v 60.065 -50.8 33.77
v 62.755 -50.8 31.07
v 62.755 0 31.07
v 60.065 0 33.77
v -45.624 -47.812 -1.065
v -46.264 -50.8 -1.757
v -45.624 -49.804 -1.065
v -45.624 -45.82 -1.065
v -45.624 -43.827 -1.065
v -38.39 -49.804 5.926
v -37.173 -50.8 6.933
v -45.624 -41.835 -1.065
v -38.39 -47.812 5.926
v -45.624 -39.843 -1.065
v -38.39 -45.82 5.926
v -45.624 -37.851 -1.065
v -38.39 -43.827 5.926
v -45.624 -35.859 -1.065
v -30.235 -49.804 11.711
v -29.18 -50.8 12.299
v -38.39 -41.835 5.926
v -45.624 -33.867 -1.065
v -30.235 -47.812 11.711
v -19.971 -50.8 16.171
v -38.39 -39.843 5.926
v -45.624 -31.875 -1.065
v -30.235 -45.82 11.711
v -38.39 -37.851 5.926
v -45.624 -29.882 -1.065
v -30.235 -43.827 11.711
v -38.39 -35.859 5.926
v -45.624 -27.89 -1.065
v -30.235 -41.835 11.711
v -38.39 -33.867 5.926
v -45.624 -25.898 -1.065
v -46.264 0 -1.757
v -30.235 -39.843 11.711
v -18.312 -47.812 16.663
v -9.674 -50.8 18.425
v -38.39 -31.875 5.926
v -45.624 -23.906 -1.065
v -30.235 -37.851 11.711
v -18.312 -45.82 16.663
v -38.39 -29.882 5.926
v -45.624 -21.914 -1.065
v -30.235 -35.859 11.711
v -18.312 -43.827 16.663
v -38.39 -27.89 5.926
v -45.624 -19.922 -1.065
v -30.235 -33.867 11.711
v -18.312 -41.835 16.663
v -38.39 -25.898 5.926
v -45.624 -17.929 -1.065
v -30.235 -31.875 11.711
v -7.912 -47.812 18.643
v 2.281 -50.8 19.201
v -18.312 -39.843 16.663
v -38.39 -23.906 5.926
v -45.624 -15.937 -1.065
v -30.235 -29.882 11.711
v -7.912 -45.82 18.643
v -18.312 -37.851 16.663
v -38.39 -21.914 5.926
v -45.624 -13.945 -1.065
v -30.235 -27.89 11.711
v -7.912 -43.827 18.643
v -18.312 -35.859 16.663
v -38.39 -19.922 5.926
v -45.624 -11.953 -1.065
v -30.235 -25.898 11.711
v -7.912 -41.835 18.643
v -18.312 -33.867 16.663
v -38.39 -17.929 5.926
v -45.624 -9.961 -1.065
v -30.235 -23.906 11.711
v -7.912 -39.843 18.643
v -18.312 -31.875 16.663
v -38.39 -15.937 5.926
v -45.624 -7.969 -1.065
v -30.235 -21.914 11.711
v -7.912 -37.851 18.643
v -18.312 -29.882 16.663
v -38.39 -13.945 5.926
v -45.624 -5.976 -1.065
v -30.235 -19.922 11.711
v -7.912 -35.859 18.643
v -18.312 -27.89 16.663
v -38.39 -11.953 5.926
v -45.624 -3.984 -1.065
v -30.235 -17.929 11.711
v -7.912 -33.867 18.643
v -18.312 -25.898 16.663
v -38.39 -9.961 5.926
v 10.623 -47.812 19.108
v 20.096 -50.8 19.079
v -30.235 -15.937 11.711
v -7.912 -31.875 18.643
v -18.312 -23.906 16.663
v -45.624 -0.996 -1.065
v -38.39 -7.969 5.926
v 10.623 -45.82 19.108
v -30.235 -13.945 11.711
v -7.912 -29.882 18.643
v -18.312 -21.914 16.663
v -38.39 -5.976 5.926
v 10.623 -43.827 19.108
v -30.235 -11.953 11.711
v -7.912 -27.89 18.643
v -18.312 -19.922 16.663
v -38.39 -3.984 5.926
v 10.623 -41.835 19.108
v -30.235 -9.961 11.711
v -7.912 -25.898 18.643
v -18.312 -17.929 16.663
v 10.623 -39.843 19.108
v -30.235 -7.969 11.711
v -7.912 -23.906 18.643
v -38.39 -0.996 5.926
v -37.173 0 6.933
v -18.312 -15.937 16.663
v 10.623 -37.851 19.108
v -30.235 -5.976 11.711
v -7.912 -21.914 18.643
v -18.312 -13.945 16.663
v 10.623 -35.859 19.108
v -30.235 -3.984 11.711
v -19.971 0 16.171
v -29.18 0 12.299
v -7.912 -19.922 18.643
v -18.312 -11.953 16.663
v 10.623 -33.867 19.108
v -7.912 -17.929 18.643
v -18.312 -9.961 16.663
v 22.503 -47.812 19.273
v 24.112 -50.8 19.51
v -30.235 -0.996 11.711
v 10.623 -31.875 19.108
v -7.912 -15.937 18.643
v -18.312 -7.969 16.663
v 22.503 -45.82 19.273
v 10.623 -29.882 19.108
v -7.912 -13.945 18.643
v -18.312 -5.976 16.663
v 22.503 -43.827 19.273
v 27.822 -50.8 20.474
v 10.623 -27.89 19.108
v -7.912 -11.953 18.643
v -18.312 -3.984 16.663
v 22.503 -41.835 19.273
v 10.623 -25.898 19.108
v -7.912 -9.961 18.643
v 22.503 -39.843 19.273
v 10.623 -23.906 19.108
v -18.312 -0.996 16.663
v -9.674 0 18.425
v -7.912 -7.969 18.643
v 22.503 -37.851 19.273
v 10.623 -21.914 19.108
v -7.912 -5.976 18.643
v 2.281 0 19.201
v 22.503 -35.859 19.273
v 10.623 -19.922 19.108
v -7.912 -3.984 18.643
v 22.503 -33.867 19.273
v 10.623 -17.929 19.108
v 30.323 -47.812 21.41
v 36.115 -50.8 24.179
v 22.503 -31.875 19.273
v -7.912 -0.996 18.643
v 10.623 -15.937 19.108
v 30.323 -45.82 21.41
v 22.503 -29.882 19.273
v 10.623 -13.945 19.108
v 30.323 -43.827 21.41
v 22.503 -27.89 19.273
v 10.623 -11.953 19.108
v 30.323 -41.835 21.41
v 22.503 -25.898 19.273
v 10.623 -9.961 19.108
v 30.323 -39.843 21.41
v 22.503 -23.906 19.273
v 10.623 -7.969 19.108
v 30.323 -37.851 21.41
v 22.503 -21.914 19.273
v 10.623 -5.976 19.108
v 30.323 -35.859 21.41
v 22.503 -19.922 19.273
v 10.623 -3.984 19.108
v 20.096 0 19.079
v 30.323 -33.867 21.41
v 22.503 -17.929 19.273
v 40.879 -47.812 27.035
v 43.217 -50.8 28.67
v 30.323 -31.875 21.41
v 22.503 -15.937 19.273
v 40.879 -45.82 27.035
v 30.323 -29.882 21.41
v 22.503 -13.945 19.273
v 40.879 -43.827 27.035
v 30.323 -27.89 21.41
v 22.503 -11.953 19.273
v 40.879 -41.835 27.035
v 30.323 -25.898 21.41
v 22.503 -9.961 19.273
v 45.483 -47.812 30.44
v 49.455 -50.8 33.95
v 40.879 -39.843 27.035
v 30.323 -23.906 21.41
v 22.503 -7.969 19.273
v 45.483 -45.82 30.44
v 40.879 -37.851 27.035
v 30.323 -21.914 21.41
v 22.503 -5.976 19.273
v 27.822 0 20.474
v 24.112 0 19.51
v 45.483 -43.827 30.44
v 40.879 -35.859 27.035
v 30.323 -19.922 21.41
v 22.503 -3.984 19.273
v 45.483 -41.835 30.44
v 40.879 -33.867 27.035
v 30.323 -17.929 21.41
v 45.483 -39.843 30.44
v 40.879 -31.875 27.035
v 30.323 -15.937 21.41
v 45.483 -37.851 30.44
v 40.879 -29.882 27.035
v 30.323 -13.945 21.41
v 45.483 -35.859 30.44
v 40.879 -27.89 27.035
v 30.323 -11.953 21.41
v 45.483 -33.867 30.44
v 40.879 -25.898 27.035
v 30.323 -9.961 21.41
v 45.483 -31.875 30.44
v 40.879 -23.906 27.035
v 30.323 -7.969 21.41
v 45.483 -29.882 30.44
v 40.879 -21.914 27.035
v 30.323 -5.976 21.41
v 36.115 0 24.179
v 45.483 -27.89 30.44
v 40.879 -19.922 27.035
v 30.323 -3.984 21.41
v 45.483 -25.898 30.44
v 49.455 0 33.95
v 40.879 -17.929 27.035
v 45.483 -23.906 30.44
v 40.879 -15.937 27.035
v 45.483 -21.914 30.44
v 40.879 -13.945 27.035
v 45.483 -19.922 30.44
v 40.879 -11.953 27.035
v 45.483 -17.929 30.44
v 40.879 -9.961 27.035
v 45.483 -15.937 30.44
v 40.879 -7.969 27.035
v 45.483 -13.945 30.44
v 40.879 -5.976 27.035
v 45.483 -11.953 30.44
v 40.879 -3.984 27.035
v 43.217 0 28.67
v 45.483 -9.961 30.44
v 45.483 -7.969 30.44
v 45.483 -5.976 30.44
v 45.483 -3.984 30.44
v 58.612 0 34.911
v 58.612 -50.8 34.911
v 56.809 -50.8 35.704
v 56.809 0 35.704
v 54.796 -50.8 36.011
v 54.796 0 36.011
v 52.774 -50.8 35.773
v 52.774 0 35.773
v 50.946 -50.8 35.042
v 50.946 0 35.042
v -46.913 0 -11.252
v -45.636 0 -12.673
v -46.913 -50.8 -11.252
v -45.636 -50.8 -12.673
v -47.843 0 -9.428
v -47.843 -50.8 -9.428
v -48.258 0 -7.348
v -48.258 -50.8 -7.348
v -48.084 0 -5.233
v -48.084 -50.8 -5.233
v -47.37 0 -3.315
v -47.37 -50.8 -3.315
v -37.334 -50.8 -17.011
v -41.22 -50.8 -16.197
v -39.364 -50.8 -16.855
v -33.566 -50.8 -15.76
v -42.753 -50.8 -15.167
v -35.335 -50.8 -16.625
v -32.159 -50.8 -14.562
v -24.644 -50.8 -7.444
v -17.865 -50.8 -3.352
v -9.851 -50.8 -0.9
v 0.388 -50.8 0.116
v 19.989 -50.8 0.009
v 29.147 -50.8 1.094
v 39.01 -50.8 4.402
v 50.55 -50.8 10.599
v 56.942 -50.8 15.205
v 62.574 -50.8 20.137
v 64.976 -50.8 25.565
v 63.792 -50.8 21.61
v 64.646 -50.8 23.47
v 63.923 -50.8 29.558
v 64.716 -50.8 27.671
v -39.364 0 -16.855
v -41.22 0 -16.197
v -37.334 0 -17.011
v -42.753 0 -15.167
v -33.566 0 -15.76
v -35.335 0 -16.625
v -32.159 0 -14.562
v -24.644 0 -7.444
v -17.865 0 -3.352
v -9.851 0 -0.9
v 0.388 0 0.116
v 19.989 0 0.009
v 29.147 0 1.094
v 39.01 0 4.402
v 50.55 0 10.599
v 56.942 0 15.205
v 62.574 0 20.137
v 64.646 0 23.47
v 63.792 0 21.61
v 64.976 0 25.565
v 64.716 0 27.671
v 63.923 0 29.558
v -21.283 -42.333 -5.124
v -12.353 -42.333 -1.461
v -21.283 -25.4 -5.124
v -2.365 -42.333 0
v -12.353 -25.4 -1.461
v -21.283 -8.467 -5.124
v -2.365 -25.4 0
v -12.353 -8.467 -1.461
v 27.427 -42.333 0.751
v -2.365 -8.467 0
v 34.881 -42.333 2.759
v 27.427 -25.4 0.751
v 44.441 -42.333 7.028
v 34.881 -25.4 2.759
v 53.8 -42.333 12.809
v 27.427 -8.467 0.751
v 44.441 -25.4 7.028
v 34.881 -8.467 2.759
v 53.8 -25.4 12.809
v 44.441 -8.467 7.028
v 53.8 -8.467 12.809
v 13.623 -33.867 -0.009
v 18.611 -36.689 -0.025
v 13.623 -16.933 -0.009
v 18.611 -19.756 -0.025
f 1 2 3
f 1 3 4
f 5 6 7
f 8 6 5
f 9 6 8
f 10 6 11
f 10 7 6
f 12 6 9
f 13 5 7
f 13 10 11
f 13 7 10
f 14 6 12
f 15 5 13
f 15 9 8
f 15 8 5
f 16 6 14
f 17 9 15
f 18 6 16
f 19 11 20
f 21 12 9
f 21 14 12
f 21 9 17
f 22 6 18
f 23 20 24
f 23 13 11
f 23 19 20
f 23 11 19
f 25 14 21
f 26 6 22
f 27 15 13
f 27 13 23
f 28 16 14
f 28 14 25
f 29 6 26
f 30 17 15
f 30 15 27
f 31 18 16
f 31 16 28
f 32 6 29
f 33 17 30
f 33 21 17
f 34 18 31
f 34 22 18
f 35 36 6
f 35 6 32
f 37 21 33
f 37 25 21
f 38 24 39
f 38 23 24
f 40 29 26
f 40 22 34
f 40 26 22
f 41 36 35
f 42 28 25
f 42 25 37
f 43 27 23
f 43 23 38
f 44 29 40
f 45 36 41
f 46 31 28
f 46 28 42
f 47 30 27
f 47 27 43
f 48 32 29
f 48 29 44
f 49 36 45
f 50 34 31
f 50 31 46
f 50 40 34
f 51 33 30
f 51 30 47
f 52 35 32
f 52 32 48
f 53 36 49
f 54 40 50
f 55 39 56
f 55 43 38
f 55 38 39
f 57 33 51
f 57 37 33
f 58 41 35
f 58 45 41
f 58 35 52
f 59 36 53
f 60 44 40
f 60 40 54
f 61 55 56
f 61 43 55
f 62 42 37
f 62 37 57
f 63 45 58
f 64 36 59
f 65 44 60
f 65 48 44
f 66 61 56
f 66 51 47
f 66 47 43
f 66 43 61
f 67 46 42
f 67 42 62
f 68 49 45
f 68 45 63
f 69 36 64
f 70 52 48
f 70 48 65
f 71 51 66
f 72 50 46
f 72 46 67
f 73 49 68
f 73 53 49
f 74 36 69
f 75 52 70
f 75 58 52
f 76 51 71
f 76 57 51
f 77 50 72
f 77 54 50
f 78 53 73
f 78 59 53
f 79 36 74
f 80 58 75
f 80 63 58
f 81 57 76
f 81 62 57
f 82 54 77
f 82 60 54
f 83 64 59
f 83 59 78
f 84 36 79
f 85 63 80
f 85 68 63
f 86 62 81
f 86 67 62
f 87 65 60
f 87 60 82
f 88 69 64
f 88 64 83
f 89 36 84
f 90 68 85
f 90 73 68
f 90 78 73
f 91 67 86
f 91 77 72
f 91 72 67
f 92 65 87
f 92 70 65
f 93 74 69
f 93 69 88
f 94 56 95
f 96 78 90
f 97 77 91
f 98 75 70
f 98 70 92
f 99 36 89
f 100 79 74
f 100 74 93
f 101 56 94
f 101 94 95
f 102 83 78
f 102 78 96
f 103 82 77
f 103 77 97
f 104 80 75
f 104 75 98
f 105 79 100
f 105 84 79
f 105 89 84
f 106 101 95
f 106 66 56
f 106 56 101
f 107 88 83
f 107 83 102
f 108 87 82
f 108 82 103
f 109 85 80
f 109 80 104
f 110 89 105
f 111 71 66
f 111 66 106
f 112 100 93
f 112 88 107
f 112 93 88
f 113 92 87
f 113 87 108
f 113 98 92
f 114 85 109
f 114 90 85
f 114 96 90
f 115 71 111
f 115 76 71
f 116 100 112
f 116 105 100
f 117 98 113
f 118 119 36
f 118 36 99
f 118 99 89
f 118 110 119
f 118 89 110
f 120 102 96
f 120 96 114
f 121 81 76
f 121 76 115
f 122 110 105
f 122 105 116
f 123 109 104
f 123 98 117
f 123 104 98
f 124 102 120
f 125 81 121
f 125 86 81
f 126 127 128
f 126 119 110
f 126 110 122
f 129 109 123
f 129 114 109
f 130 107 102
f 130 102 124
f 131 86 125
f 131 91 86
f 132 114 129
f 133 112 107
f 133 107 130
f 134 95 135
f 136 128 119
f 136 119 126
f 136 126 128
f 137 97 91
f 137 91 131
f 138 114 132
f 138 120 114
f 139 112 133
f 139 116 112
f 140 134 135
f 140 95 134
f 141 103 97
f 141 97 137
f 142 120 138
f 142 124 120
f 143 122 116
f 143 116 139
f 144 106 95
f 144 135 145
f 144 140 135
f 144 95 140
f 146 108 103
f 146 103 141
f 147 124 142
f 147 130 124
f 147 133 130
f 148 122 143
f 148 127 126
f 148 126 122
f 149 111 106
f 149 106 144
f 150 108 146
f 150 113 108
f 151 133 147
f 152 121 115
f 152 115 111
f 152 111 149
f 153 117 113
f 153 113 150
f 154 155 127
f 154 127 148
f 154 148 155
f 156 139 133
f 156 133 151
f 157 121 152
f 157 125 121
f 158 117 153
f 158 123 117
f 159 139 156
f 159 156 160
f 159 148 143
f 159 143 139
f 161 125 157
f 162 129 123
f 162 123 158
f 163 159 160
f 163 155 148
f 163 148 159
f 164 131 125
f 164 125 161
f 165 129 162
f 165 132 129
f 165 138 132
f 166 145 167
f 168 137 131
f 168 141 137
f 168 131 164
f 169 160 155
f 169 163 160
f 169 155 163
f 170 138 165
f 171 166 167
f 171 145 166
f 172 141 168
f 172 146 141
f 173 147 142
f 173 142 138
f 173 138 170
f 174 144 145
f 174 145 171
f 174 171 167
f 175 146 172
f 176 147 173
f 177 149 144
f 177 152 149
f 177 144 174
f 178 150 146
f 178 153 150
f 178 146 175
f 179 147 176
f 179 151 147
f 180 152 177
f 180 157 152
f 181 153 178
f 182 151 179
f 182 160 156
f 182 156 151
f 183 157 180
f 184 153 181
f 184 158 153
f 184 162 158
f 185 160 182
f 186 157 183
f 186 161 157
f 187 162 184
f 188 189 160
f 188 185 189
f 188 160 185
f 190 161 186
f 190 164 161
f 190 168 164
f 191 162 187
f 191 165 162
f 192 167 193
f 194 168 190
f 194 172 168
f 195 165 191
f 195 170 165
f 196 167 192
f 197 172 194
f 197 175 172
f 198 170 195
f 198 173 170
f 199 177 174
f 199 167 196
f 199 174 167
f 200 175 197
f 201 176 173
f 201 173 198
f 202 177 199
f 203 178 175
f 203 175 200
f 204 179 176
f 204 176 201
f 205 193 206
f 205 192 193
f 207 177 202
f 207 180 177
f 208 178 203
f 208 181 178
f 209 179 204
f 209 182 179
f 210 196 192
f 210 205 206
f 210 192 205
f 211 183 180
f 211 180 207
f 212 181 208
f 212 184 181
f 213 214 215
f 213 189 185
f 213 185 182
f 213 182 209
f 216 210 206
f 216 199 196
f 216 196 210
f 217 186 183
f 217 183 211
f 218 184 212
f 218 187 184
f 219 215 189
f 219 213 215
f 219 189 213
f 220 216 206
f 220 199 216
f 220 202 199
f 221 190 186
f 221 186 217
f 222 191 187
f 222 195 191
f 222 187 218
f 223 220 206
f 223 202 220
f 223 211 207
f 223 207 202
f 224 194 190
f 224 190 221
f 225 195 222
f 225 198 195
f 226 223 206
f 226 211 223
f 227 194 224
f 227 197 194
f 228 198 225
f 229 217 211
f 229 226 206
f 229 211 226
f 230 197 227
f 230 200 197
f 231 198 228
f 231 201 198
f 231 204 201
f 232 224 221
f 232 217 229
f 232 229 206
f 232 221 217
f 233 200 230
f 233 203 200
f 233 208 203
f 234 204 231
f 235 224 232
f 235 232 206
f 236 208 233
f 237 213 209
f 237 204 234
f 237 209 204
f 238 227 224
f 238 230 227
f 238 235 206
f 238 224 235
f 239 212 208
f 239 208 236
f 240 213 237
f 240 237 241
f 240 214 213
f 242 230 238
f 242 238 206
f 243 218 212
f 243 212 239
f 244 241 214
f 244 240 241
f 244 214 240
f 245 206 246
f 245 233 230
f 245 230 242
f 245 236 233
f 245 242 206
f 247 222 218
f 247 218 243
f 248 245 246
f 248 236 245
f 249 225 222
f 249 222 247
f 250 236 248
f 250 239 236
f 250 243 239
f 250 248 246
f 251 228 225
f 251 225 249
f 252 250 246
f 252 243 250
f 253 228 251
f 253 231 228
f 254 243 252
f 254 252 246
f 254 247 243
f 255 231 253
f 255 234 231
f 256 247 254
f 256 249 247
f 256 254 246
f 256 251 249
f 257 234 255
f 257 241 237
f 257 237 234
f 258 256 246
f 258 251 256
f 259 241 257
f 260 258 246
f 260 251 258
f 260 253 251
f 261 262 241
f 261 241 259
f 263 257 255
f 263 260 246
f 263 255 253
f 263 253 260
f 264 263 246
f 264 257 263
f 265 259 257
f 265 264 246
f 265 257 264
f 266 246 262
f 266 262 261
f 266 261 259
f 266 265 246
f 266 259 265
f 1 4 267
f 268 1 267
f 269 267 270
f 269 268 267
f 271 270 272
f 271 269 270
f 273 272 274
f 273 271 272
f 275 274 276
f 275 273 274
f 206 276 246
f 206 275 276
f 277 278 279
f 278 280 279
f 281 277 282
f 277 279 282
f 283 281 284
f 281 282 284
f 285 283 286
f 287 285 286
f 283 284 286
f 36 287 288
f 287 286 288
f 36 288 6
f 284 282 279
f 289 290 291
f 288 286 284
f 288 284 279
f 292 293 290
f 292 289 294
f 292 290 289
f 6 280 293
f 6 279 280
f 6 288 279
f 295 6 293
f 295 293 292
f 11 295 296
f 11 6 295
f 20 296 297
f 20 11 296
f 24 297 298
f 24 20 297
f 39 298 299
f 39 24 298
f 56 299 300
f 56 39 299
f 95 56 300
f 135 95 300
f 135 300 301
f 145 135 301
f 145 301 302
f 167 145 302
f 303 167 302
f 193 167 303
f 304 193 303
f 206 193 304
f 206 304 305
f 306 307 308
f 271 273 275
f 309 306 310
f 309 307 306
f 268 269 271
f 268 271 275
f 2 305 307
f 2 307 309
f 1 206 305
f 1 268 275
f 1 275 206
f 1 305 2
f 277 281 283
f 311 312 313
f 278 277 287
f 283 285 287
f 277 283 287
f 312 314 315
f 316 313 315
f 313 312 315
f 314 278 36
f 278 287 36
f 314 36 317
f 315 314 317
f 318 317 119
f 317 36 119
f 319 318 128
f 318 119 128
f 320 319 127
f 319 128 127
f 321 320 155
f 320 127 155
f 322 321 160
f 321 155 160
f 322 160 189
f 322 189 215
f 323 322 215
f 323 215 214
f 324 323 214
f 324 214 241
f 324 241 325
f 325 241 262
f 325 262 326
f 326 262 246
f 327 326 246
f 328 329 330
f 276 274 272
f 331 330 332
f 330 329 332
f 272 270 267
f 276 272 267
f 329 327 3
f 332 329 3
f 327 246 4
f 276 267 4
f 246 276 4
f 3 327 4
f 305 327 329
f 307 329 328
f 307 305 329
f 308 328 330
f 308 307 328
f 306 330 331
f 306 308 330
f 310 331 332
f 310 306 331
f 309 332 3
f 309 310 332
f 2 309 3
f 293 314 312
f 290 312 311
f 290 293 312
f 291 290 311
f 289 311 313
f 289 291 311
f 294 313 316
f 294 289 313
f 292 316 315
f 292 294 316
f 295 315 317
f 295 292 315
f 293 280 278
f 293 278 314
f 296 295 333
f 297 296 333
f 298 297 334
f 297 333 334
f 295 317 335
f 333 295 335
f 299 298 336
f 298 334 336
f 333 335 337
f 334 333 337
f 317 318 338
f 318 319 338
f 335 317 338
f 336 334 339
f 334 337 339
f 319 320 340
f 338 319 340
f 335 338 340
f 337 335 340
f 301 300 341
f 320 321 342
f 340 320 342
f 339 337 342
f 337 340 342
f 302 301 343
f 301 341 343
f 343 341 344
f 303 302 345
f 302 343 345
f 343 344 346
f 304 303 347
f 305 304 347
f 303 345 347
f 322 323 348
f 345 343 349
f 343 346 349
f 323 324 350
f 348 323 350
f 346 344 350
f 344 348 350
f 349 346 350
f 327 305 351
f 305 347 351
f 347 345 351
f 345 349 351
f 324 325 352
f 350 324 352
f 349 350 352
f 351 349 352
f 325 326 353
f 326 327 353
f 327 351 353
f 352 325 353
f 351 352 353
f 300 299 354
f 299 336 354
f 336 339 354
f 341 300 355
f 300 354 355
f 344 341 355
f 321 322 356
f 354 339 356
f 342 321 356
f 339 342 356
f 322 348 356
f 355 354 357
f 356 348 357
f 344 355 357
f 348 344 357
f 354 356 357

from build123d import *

# Parameters (mm, degrees)
F1_DEPTH = 50.8
F2_R     = 7.62


# Not quite as in the source:
# - the dataset's text gives a spline's control points without its knots; the knots are read off the source's solid


with BuildPart() as f1:
    # F0 (on Front) → F1 (new body)
    with BuildSketch(Plane.XZ):
        with BuildLine():
            Line((-51.4566205376, -7.6382097449), (-37.0489656925, -20.1010350138))
            add(Edge.make_bspline(
                [(-37.0489656925, -20.1010350138), (-32.0961571271, -14.3753384093), (-22.4411994409, -3.2137201658), (-2.567876156, 1.0362784201), (19.8507775599, -0.7305766437), (35.0126136642, 1.7996710925), (54.6374865112, 12.120662721), (63.7504331122, 21.1999324541), (68.1858584285, 25.6189666688)],
                knots=[0, 0, 0, 0, 0.1744362409, 0.340044341, 0.5157839146, 0.662689084, 0.8358250694, 1, 1, 1, 1], degree=3))
            Line((68.1858584285, 25.6189666688), (54.7404326534, 39.1142642774))
            add(Edge.make_bspline(
                [(-51.4566205376, -7.6382097449), (-50.569332054, -6.6124594882), (-48.7206333421, -4.4744710724), (-45.6807379161, -1.083016907), (-42.8655113291, 1.8341952687), (-40.3934284717, 4.1792576456), (-38.413862066, 5.9302516977), (-36.2924687687, 7.6576678013), (-34.392168296, 9.0614262042), (-32.7845564877, 10.1507045755), (-31.5329658928, 10.9476488916), (-30.2357008088, 11.7189891488), (-28.9317170147, 12.440929508), (-27.6164352854, 13.1185008592), (-25.8531615823, 13.961984086), (-22.7482671671, 15.2847678022), (-18.2999008711, 16.7576548912), (-13.9122537643, 17.7575537331), (-10.4620230508, 18.3293395163), (-7.9060318762, 18.6573853028), (-5.3849265205, 18.8972362958), (-2.8912531141, 19.060728488), (-0.4571417194, 19.1579367871), (2.6992657096, 19.2188727368), (6.4751057026, 19.1986064325), (10.688599572, 19.1069677477), (13.872523357, 19.034713831), (16.1671624828, 19.0086227881), (17.4801550196, 19.0099656248), (18.4476603272, 19.0234519818), (19.126692671, 19.0398701949), (19.7635064415, 19.0627895847), (20.5708993056, 19.1021374284), (21.5017087851, 19.1671291568), (22.853887137, 19.3033614178), (24.3475932959, 19.5320424193), (25.7829635166, 19.8577835208), (27.0218215144, 20.2115138008), (28.0214471049, 20.5347589257), (29.1187561712, 20.9292509093), (30.7086380041, 21.5547332667), (32.8673205533, 22.5055753198), (35.5872650511, 23.8682182699), (37.8559849368, 25.1420412869), (39.6138298192, 26.2132708199), (40.8886976676, 27.0336077895), (42.1078319952, 27.8629622939), (43.2480720812, 28.68464647), (44.37217855, 29.5417355035), (45.8540278008, 30.7312919433), (47.6956238749, 32.3155185334), (50.6875135665, 35.0808060073), (53.0519039531, 37.4319755301), (54.7404326534, 39.1142642774)],
                knots=[0, 0, 0, 0, 0.03125, 0.0625, 0.09375, 0.109375, 0.125, 0.140625, 0.15625, 0.1640625, 0.171875, 0.1796875, 0.1875, 0.1953125, 0.203125, 0.21875, 0.25, 0.28125, 0.296875, 0.3125, 0.328125, 0.34375, 0.359375, 0.375, 0.40625, 0.4375, 0.46875, 0.484375, 0.5, 0.5078125, 0.515625, 0.5234375, 0.53125, 0.546875, 0.5625, 0.59375, 0.625, 0.640625, 0.65625, 0.671875, 0.6875, 0.71875, 0.75, 0.78125, 0.796875, 0.8125, 0.828125, 0.84375, 0.859375, 0.875, 0.90625, 0.9375, 1, 1, 1, 1], degree=3))
        make_face()
    extrude(amount=F1_DEPTH)

    # F2
    f2_edges = [f1.edges().sort_by_distance(p)[0] for p in [
        (54.740433, -25.4, 39.114264),
        (68.185858, -25.4, 25.618967),
        (-51.456621, -25.4, -7.63821),
        (-37.048966, -25.4, -20.101035),
    ]]
    fillet(f2_edges, radius=F2_R)


solid = f1.part
